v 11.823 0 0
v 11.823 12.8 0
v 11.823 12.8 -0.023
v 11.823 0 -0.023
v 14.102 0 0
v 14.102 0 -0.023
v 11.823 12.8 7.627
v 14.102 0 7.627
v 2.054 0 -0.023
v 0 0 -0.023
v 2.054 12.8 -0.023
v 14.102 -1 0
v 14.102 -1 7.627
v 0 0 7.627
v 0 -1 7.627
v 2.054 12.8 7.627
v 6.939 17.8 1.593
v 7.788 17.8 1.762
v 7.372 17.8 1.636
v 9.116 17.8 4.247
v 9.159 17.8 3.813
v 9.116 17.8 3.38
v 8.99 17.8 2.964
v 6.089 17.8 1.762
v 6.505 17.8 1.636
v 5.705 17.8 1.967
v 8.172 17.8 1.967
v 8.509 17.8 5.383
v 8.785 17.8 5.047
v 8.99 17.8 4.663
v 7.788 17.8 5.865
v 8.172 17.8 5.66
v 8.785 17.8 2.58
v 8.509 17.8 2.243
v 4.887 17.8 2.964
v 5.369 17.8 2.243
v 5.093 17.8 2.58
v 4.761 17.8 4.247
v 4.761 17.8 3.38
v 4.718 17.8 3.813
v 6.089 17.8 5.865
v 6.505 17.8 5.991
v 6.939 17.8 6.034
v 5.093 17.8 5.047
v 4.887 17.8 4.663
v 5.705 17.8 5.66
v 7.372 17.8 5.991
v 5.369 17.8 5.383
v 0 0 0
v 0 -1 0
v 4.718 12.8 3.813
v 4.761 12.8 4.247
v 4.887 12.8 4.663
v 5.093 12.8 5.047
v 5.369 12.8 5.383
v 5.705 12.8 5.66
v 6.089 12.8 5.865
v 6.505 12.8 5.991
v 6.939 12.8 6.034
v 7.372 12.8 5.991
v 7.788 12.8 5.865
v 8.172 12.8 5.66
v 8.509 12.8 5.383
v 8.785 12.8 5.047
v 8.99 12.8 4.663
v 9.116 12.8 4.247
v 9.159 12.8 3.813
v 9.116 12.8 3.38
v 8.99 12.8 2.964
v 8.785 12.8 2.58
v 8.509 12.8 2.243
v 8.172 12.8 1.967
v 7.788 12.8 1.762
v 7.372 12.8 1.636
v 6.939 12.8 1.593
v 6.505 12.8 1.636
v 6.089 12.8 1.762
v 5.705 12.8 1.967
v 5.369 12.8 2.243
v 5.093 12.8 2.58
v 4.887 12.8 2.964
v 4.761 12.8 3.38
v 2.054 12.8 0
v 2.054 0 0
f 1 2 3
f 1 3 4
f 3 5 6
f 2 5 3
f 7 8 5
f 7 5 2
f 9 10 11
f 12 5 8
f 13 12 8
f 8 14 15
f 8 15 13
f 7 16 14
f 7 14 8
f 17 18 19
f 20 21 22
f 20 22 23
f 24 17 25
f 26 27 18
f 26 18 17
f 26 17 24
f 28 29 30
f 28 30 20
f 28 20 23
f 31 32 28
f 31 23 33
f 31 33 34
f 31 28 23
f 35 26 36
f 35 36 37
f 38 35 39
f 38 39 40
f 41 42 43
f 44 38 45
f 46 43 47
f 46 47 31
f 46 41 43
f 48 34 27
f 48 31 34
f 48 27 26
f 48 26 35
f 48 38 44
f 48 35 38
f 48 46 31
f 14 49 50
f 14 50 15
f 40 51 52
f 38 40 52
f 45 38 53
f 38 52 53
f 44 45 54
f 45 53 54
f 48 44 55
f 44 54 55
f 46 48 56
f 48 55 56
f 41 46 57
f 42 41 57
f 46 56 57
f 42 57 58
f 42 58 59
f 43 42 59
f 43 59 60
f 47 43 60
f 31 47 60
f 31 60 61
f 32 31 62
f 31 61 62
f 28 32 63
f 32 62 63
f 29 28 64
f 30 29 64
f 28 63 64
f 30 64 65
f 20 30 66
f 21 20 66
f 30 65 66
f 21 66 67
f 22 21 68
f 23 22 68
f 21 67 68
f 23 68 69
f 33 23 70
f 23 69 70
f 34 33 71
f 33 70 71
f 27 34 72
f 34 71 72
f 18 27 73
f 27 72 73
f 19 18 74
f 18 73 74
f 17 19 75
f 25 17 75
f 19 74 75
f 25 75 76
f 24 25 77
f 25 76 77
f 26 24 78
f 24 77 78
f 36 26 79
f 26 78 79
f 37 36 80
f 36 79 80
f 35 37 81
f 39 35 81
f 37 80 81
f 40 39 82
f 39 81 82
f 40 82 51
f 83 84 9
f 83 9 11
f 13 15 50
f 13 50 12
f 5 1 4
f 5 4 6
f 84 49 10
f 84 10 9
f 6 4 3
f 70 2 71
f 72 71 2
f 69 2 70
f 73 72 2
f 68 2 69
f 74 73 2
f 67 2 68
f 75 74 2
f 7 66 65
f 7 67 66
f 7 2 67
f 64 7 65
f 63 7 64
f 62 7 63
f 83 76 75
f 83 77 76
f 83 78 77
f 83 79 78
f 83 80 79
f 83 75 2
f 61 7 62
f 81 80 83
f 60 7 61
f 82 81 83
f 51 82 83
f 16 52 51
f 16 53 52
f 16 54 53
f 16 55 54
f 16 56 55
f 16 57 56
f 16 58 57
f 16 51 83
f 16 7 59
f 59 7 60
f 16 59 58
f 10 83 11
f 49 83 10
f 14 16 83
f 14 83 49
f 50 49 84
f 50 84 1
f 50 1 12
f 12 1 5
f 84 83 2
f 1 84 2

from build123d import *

# Parameters (mm, degrees)
F0_W     = 14.1024803743
F0_H     = 7.6268524863
F1_DEPTH = 1
F2_W     = 9.7692511044
F2_H     = 7.6268524863
F3_DEPTH = 12.8
F5_DEPTH = 7.65
F6_R     = 2.220289971
F7_DEPTH = 5


with BuildPart() as f1:
    # F0 (on Front) → F1 (new body)
    with BuildSketch(Plane.XZ):
        with Locations((7.0512401871, 3.8134262431)):
            Rectangle(F0_W, F0_H)
    extrude(amount=F1_DEPTH)

    # F2 (on face) → F3 (join)
    with BuildSketch(Plane(origin=(0, 0, 0), x_dir=(-1, 0, 0), z_dir=(0, 1, 0))):
        with Locations((-6.9386514369, 3.8134262431)):
            Rectangle(F2_W, F2_H)
    extrude(amount=F3_DEPTH)

    # F4 (on face) → F5 (join)
    with BuildSketch(Plane.XY.offset(7.6268524863)):
        Polygon((11.8232769892, 0), (14.1024803743, 0), (11.8232769892, 12.8), align=None)
        Polygon((2.0540258847, 0), (2.0540258847, 12.8), (0, 0), align=None)
    extrude(amount=-F5_DEPTH)

    # F6 (on face) → F7 (join)
    with BuildSketch(Plane(origin=(0, 12.8, 0), x_dir=(-1, 0, 0), z_dir=(0, 1, 0))):
        with Locations((-6.9386514369, 3.8134262431)):
            Circle(F6_R)
    extrude(amount=F7_DEPTH)


solid = f1.part
